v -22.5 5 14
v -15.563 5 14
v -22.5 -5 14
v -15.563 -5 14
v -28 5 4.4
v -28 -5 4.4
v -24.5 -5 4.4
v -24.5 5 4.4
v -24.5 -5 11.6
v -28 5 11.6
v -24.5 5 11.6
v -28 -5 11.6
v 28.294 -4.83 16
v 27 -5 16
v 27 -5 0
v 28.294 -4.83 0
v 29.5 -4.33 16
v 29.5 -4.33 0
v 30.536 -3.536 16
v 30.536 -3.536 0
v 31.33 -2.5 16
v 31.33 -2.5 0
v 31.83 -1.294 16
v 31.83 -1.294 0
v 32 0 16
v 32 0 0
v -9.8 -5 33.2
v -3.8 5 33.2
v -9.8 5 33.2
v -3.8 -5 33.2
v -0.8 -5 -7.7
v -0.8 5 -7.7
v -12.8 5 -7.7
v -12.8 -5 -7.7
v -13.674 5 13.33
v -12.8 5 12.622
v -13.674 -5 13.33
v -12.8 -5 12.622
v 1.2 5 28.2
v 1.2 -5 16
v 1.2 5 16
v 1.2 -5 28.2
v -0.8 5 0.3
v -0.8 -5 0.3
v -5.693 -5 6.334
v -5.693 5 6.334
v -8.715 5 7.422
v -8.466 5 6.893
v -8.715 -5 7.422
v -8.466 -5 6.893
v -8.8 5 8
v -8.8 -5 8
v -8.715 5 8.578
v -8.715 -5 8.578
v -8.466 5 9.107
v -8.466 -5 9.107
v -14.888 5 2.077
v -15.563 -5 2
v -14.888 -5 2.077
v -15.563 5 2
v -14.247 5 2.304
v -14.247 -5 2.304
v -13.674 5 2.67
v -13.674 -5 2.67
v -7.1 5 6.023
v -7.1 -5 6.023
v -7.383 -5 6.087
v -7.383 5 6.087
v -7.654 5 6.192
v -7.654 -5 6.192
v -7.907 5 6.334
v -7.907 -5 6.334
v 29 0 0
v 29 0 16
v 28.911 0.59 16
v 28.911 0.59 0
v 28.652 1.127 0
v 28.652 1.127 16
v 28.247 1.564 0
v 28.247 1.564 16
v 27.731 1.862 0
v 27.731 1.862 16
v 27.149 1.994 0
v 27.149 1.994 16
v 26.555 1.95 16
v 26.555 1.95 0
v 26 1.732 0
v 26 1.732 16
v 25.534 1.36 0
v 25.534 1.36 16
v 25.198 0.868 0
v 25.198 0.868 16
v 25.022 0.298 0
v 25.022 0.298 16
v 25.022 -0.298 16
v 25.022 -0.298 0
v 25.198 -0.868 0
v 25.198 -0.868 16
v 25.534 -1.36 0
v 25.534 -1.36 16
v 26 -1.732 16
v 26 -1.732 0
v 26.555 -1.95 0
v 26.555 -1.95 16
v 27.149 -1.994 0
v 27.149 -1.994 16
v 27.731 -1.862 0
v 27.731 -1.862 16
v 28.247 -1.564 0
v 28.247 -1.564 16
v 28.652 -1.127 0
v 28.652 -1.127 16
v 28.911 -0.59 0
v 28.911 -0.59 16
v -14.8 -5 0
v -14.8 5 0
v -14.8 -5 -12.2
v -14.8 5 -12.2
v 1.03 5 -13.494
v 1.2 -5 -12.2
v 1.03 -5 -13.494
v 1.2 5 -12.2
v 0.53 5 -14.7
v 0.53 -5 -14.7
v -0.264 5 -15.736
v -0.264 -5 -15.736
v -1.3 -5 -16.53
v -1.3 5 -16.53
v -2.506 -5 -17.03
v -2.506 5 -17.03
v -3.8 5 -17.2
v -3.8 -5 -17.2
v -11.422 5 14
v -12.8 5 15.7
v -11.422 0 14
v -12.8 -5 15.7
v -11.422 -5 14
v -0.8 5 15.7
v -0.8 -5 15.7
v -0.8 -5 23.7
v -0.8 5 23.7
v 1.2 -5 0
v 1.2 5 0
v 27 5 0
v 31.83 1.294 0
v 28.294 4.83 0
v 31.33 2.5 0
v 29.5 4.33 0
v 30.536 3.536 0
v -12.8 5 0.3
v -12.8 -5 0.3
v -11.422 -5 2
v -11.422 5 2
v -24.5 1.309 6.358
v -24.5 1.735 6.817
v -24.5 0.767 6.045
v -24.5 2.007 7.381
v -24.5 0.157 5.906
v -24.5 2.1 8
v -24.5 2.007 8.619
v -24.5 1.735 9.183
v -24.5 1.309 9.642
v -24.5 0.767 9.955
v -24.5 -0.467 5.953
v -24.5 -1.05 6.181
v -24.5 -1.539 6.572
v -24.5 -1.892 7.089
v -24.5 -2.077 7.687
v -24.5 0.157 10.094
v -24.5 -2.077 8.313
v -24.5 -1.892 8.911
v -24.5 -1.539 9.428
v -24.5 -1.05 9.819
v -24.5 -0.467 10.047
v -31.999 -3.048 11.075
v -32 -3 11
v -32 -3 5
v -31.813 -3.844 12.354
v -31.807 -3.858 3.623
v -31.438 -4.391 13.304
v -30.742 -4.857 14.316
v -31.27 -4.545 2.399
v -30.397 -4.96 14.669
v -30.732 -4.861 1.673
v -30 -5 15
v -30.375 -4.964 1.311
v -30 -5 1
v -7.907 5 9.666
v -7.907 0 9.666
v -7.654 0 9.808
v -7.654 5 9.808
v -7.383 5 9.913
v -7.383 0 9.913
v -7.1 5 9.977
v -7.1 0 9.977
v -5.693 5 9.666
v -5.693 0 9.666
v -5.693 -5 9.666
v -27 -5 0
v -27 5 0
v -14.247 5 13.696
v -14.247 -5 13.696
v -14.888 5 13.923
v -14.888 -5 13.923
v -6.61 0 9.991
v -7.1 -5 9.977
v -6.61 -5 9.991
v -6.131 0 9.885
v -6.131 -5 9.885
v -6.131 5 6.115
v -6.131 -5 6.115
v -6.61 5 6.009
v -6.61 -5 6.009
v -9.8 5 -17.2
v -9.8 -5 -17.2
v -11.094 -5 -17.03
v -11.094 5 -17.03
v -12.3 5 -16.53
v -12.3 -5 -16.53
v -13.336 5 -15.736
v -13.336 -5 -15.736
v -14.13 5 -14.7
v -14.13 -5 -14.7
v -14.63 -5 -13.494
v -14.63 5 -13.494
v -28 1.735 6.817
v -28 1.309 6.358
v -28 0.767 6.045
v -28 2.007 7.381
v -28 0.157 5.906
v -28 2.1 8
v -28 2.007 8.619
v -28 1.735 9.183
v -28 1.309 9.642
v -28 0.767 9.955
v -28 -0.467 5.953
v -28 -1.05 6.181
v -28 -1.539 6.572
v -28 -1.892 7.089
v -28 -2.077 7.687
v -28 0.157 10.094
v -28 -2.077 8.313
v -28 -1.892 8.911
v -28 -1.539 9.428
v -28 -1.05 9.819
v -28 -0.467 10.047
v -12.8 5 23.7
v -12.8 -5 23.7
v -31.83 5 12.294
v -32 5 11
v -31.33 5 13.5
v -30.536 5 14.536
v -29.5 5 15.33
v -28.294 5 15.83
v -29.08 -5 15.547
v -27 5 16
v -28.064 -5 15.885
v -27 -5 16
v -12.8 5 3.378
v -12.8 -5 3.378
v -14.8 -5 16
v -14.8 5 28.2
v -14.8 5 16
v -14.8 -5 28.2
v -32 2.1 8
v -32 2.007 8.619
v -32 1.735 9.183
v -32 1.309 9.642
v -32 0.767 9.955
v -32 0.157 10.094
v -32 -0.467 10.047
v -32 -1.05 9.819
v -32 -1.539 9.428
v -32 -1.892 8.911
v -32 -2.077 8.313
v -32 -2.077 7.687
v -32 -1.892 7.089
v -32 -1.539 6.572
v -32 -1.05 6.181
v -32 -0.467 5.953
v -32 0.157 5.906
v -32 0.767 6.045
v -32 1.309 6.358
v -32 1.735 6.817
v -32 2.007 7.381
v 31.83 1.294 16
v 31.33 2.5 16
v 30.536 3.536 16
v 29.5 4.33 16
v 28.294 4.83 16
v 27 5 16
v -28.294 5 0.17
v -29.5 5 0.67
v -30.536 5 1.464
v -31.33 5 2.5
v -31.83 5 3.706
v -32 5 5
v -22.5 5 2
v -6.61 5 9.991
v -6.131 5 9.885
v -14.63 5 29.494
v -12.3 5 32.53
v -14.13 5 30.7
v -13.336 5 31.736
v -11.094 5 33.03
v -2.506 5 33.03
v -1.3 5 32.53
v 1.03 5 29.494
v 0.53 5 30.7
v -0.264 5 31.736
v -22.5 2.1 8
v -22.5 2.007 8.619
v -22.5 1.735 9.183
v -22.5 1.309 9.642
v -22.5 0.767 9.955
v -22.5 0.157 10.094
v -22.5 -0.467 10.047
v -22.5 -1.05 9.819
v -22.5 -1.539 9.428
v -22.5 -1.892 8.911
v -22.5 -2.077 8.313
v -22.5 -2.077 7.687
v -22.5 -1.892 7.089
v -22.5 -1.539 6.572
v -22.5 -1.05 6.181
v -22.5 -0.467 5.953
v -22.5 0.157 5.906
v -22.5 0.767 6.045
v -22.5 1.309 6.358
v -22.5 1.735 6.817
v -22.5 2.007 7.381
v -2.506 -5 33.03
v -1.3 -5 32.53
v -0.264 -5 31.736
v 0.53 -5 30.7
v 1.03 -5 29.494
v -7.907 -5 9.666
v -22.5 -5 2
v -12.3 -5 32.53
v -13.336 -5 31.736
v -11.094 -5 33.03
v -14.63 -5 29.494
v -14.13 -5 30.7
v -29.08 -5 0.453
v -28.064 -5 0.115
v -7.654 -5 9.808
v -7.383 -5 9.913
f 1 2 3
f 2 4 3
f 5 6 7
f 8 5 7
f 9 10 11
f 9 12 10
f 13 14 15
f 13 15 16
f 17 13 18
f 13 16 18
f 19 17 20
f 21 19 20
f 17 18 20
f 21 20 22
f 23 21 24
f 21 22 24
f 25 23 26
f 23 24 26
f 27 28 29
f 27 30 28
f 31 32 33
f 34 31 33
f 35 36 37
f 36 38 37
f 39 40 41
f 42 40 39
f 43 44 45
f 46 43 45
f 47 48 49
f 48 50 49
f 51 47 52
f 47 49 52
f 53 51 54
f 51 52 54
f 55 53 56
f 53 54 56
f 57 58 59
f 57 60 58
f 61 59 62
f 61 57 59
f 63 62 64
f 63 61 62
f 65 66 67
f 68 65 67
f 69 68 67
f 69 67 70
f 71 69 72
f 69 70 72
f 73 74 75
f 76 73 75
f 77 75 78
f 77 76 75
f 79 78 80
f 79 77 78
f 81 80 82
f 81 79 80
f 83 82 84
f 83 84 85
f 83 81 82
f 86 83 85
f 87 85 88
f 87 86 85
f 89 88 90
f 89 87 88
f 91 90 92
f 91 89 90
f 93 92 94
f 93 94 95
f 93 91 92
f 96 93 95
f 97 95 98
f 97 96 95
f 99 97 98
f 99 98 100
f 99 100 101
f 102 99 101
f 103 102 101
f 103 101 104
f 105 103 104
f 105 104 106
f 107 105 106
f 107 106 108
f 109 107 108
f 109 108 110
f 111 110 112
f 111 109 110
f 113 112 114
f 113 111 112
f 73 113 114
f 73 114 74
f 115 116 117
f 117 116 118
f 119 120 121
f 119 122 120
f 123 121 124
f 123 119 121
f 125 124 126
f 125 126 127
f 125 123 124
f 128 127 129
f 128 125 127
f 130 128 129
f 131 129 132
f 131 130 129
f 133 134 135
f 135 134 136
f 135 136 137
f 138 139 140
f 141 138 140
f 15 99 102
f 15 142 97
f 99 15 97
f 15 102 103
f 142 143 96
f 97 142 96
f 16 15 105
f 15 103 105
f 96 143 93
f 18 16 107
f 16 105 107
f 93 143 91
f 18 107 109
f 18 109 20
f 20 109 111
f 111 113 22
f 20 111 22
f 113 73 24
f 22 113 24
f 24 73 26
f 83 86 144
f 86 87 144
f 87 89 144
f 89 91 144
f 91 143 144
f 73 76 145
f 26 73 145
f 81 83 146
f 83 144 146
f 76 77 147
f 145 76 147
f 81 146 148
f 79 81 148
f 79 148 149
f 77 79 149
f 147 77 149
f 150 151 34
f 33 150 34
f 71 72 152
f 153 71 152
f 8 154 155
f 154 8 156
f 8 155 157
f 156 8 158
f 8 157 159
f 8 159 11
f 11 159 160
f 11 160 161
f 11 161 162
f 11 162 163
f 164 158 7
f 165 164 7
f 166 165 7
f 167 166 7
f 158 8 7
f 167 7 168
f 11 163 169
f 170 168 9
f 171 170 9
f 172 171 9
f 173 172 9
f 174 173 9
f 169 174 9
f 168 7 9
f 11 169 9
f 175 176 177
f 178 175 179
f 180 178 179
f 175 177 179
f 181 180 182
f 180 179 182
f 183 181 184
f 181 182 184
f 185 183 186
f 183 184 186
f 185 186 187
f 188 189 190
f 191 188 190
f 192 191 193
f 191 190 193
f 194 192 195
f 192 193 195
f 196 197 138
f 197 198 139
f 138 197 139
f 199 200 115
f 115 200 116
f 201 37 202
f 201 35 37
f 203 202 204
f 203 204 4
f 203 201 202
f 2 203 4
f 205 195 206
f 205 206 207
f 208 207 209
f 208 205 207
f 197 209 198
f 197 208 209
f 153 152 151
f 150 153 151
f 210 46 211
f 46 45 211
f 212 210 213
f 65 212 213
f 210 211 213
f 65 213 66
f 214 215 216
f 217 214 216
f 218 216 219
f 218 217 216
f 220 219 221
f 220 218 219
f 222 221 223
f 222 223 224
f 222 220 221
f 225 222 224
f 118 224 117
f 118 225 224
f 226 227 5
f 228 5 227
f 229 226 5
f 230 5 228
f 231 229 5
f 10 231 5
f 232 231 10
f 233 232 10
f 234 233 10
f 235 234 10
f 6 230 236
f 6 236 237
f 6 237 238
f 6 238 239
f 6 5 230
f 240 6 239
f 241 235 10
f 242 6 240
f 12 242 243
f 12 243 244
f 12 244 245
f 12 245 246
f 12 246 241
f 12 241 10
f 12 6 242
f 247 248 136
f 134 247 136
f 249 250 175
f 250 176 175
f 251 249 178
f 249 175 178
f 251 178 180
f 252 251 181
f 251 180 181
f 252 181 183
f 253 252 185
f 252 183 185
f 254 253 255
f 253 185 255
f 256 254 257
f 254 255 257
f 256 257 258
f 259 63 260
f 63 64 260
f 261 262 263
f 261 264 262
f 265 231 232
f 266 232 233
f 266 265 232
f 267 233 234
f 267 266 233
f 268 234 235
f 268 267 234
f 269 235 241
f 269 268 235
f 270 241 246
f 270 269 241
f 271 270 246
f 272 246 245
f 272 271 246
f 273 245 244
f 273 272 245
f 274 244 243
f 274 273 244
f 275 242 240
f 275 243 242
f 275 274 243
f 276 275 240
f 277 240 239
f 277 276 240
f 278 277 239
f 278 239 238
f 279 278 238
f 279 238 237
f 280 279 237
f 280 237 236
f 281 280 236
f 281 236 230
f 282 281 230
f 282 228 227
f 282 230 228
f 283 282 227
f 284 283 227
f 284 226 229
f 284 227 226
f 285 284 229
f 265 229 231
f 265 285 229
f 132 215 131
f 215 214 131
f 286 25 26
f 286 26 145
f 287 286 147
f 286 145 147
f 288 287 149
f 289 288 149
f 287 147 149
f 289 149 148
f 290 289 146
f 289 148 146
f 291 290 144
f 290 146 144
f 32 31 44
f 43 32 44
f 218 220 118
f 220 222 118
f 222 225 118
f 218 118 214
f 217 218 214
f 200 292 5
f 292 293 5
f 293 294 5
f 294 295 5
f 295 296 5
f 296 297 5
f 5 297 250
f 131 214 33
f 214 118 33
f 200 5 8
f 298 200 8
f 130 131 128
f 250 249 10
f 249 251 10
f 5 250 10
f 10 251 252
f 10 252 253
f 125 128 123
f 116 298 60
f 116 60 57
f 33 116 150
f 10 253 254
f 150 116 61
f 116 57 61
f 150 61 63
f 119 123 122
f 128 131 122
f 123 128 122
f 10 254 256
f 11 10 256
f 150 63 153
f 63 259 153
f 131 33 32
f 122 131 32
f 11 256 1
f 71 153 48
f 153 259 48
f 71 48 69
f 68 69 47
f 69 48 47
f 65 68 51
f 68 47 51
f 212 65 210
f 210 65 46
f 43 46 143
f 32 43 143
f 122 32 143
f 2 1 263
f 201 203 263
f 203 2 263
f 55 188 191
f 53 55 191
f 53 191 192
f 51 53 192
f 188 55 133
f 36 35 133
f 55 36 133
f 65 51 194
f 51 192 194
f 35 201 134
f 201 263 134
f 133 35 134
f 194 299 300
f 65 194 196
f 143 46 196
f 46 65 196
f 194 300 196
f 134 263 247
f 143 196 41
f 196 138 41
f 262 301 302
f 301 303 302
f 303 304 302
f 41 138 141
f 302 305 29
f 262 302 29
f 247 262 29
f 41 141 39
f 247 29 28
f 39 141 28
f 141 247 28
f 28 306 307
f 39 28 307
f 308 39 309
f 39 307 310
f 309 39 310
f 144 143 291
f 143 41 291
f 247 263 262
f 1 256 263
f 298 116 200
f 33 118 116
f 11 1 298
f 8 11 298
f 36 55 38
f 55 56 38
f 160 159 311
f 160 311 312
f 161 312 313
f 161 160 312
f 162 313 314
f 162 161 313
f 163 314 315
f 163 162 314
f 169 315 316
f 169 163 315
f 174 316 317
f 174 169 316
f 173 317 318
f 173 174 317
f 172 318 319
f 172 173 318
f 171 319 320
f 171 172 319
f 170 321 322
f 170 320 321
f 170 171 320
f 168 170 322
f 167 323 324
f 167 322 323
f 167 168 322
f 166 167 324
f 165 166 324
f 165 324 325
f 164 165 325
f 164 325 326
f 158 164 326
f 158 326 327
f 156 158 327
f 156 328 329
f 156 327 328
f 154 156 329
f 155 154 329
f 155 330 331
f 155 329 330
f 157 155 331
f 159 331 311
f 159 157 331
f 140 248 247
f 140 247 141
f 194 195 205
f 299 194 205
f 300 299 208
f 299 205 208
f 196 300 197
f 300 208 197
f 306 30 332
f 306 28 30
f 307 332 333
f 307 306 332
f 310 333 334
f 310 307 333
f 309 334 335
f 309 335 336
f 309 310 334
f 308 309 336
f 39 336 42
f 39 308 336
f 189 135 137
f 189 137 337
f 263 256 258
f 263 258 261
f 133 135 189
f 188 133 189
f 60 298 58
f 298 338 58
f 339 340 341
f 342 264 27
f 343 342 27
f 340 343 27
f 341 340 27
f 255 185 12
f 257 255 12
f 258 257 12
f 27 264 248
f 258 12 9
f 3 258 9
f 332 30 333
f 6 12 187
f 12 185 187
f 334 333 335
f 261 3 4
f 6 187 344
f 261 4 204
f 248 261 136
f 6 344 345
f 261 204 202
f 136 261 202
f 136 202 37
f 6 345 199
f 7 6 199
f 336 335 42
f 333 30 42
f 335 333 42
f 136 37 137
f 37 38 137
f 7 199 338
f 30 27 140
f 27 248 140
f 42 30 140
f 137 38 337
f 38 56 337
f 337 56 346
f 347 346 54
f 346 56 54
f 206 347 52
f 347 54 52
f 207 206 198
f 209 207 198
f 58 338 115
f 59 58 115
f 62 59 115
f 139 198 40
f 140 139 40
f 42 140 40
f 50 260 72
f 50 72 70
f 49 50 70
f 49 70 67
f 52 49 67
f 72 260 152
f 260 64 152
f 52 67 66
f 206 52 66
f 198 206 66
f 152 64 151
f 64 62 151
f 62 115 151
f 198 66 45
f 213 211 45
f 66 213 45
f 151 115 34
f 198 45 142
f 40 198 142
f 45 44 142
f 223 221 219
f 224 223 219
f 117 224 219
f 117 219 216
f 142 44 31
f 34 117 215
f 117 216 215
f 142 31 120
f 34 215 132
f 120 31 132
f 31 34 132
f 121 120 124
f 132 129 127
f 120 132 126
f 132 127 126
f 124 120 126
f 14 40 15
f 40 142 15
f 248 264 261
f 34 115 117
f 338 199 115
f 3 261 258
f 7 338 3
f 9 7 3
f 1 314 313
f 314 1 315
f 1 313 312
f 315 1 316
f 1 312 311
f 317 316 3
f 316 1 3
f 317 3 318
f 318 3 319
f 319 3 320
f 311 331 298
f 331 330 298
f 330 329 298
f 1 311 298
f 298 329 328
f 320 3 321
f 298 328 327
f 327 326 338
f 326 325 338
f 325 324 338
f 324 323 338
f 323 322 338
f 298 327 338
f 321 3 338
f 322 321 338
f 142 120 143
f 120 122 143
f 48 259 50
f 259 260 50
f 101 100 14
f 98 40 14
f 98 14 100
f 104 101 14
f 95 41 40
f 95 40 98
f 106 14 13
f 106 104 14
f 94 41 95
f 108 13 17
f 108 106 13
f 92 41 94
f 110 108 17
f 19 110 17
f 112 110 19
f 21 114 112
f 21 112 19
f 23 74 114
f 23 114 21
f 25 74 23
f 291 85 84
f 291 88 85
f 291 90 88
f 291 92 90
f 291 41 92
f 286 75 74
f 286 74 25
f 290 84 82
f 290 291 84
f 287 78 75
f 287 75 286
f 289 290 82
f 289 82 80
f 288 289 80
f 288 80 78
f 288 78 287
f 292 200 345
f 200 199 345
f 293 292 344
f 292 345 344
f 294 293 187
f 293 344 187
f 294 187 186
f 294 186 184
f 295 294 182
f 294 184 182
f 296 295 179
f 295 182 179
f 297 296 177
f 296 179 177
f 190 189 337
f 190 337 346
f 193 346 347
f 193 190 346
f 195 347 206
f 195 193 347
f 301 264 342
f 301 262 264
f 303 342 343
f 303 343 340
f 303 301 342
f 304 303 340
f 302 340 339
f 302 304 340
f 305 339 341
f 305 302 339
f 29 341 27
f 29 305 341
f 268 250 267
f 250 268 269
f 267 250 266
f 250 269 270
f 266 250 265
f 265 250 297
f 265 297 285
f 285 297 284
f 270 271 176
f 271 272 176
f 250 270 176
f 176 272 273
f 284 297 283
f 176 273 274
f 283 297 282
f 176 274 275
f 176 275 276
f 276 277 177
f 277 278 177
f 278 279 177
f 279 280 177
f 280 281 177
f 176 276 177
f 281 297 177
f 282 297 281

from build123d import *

# Parameters (mm, degrees)
F0_R      = 2
F1_DEPTH  = 16
F2_W      = 3.5
F2_H      = 7.2
F3_DEPTH  = 5
F4_DEPTH  = 5
F6_R      = 2.1
F7_DEPTH  = 10
F8_R      = 3
F9_DEPTH  = 5
F10_DEPTH = 5
F11_DEPTH = 5
F12_DEPTH = 5
F13_R     = 5


with BuildPart() as f1:
    # F0 (on Top) → F1 (new body)
    with BuildSketch(Plane.XY):
        with BuildLine():
            ThreePointArc((32, 0), (30.5355339059, 3.5355339059), (27, 5))
            Line((27, 5), (18, 5))
            Line((18, 5), (8, 5))
            Line((8, 5), (-32, 5))
            Line((-32, 5), (-32, -3))
            Line((-32, -3), (-30, -3))
            Line((-30, -3), (-30, -5))
            Line((-30, -5), (27, -5))
            ThreePointArc((27, -5), (30.5355339059, -3.5355339059), (32, 0))
        make_face()
        with Locations((27, 0)):
            Circle(F0_R, mode=Mode.SUBTRACT)
        with BuildLine():
            ThreePointArc((-32, -3), (-31.4142135624, -4.4142135624), (-30, -5))
            Line((-30, -5), (-30, -3))
            Line((-30, -3), (-32, -3))
        make_face()
    extrude(amount=F1_DEPTH)

    # F2 (on Front) → F3 (cut)
    with BuildSketch(Plane.XZ):
        with BuildLine():
            Line((-32, 16), (-32, 11))
            ThreePointArc((-32, 11), (-30.5355339059, 14.5355339059), (-27, 16))
            Line((-27, 16), (-32, 16))
        make_face()
        with BuildLine():
            Line((-32, 0), (-27, 0))
            ThreePointArc((-27, 0), (-30.5355339059, 1.4644660941), (-32, 5))
            Line((-32, 5), (-32, 0))
        make_face()
        with Locations((-26.25, 8)):
            Rectangle(F2_W, F2_H)
        with BuildLine():
            Line((-22.5, 2), (-14.5, 2))
            Line((-14.5, 2), (-12.8, 3.3783783784))
            Line((-12.8, 3.3783783784), (-8.4655588505, 6.8927901212))
            ThreePointArc((-8.4655588505, 6.8927901212), (-8.8, 8), (-8.4655588505, 9.1072098788))
            Line((-8.4655588505, 9.1072098788), (-12.8, 12.6216216216))
            Line((-12.8, 12.6216216216), (-14.5, 14))
            Line((-14.5, 14), (-22.5, 14))
            Line((-22.5, 14), (-22.5, 2))
        make_face()
    extrude(amount=-F3_DEPTH, mode=Mode.SUBTRACT)

    # F2 (on Front) → F4 (cut)
    with BuildSketch(Plane.XZ):
        with Locations((-26.25, 8)):
            Rectangle(F2_W, F2_H)
        with BuildLine():
            Line((-22.5, 2), (-14.5, 2))
            Line((-14.5, 2), (-12.8, 3.3783783784))
            Line((-12.8, 3.3783783784), (-8.4655588505, 6.8927901212))
            ThreePointArc((-8.4655588505, 6.8927901212), (-8.8, 8), (-8.4655588505, 9.1072098788))
            Line((-8.4655588505, 9.1072098788), (-12.8, 12.6216216216))
            Line((-12.8, 12.6216216216), (-14.5, 14))
            Line((-14.5, 14), (-22.5, 14))
            Line((-22.5, 14), (-22.5, 2))
        make_face()
        with BuildLine():
            Line((-32, 16), (-32, 11))
            ThreePointArc((-32, 11), (-30.5355339059, 14.5355339059), (-27, 16))
            Line((-27, 16), (-32, 16))
        make_face()
        with BuildLine():
            Line((-32, 0), (-27, 0))
            ThreePointArc((-27, 0), (-30.5355339059, 1.4644660941), (-32, 5))
            Line((-32, 5), (-32, 0))
        make_face()
    extrude(amount=F4_DEPTH, mode=Mode.SUBTRACT)

    # F6 (on offset) → F7 (cut)
    with BuildSketch(Plane.YZ.offset(-32)):
        with Locations((0, 8)):
            Circle(F6_R)
    extrude(amount=F7_DEPTH, mode=Mode.SUBTRACT)

    # F8
    f8_edges = [f1.edges().sort_by_distance(p)[0] for p in [
        (-14.5, 0, 2),
        (-14.5, 0, 14),
    ]]
    fillet(f8_edges, radius=F8_R)

    # F2 (on Front) → F9 (join)
    with BuildSketch(Plane.XZ):
        Polygon((-14.8, 33.2), (-14.8, 16), (-12.8, 16), (-12.8, 23.7), (-0.8, 23.7), (-0.8, 16), (1.2, 16), (1.2, 33.2), align=None)
        Polygon((-12.8, 0), (-14.8, 0), (-14.8, -17.2), (1.2, -17.2), (1.2, 0), (-0.8, 0), (-0.8, -7.7), (-12.8, -7.7), align=None)
    extrude(amount=F9_DEPTH)

    # F2 (on Front) → F10 (join)
    with BuildSketch(Plane.XZ):
        Polygon((-14.8, 33.2), (-14.8, 16), (-12.8, 16), (-12.8, 23.7), (-0.8, 23.7), (-0.8, 16), (1.2, 16), (1.2, 33.2), align=None)
        Polygon((-12.8, 0), (-14.8, 0), (-14.8, -17.2), (1.2, -17.2), (1.2, 0), (-0.8, 0), (-0.8, -7.7), (-12.8, -7.7), align=None)
    extrude(amount=-F10_DEPTH)

    # F2 (on Front) → F11 (cut)
    with BuildSketch(Plane.XZ):
        with BuildLine():
            Line((-12.8, 0.3), (-12.8, 0))
            Line((-12.8, 0), (-0.8, 0))
            Line((-0.8, 0), (-0.8, 0.3))
            Line((-0.8, 0.3), (-5.6927901212, 6.3344411495))
            ThreePointArc((-5.6927901212, 6.3344411495), (-6.3673294485, 6.047361735), (-7.1, 6.0226280067))
            Line((-7.1, 6.0226280067), (-7.1, 2))
            Line((-7.1, 2), (-11.4216216216, 2))
            Line((-11.4216216216, 2), (-12.8, 0.3))
        make_face()
        with BuildLine():
            Line((-7.9072098788, 6.3344411495), (-11.4216216216, 2))
            Line((-11.4216216216, 2), (-7.1, 2))
            Line((-7.1, 2), (-7.1, 6.0226280067))
            ThreePointArc((-7.1, 6.0226280067), (-7.5206710552, 6.1343544736), (-7.9072098788, 6.3344411495))
        make_face()
        with BuildLine():
            Line((-0.8, 16), (-12.8, 16))
            Line((-12.8, 16), (-12.8, 15.7))
            Line((-12.8, 15.7), (-11.4216216216, 14))
            Line((-11.4216216216, 14), (-7.1, 14))
            Line((-7.1, 14), (-7.1, 9.9773719933))
            ThreePointArc((-7.1, 9.9773719933), (-6.3673294485, 9.952638265), (-5.6927901212, 9.6655588505))
            Line((-5.6927901212, 9.6655588505), (-0.8, 15.7))
            Line((-0.8, 15.7), (-0.8, 16))
        make_face()
        with BuildLine():
            Line((-7.1, 14), (-11.4216216216, 14))
            Line((-11.4216216216, 14), (-7.9072098788, 9.6655588505))
            ThreePointArc((-7.9072098788, 9.6655588505), (-7.5206710552, 9.8656455264), (-7.1, 9.9773719933))
            Line((-7.1, 9.9773719933), (-7.1, 14))
        make_face()
    extrude(amount=-F11_DEPTH, mode=Mode.SUBTRACT)

    # F2 (on Front) → F12 (cut)
    with BuildSketch(Plane.XZ):
        with BuildLine():
            Line((-12.8, 0.3), (-12.8, 0))
            Line((-12.8, 0), (-0.8, 0))
            Line((-0.8, 0), (-0.8, 0.3))
            Line((-0.8, 0.3), (-5.6927901212, 6.3344411495))
            ThreePointArc((-5.6927901212, 6.3344411495), (-6.3673294485, 6.047361735), (-7.1, 6.0226280067))
            Line((-7.1, 6.0226280067), (-7.1, 2))
            Line((-7.1, 2), (-11.4216216216, 2))
            Line((-11.4216216216, 2), (-12.8, 0.3))
        make_face()
        with BuildLine():
            Line((-7.9072098788, 6.3344411495), (-11.4216216216, 2))
            Line((-11.4216216216, 2), (-7.1, 2))
            Line((-7.1, 2), (-7.1, 6.0226280067))
            ThreePointArc((-7.1, 6.0226280067), (-7.5206710552, 6.1343544736), (-7.9072098788, 6.3344411495))
        make_face()
        with BuildLine():
            Line((-0.8, 16), (-12.8, 16))
            Line((-12.8, 16), (-12.8, 15.7))
            Line((-12.8, 15.7), (-11.4216216216, 14))
            Line((-11.4216216216, 14), (-7.1, 14))
            Line((-7.1, 14), (-7.1, 9.9773719933))
            ThreePointArc((-7.1, 9.9773719933), (-6.3673294485, 9.952638265), (-5.6927901212, 9.6655588505))
            Line((-5.6927901212, 9.6655588505), (-0.8, 15.7))
            Line((-0.8, 15.7), (-0.8, 16))
        make_face()
        with BuildLine():
            Line((-7.1, 14), (-11.4216216216, 14))
            Line((-11.4216216216, 14), (-7.9072098788, 9.6655588505))
            ThreePointArc((-7.9072098788, 9.6655588505), (-7.5206710552, 9.8656455264), (-7.1, 9.9773719933))
            Line((-7.1, 9.9773719933), (-7.1, 14))
        make_face()
    extrude(amount=F12_DEPTH, mode=Mode.SUBTRACT)

    # F13
    f13_edges = [f1.edges().sort_by_distance(p)[0] for p in [
        (-14.8, 0, 33.2),
        (1.2, 0, 33.2),
        (-14.8, 0, -17.2),
        (1.2, 0, -17.2),
    ]]
    fillet(f13_edges, radius=F13_R)


solid = f1.part
